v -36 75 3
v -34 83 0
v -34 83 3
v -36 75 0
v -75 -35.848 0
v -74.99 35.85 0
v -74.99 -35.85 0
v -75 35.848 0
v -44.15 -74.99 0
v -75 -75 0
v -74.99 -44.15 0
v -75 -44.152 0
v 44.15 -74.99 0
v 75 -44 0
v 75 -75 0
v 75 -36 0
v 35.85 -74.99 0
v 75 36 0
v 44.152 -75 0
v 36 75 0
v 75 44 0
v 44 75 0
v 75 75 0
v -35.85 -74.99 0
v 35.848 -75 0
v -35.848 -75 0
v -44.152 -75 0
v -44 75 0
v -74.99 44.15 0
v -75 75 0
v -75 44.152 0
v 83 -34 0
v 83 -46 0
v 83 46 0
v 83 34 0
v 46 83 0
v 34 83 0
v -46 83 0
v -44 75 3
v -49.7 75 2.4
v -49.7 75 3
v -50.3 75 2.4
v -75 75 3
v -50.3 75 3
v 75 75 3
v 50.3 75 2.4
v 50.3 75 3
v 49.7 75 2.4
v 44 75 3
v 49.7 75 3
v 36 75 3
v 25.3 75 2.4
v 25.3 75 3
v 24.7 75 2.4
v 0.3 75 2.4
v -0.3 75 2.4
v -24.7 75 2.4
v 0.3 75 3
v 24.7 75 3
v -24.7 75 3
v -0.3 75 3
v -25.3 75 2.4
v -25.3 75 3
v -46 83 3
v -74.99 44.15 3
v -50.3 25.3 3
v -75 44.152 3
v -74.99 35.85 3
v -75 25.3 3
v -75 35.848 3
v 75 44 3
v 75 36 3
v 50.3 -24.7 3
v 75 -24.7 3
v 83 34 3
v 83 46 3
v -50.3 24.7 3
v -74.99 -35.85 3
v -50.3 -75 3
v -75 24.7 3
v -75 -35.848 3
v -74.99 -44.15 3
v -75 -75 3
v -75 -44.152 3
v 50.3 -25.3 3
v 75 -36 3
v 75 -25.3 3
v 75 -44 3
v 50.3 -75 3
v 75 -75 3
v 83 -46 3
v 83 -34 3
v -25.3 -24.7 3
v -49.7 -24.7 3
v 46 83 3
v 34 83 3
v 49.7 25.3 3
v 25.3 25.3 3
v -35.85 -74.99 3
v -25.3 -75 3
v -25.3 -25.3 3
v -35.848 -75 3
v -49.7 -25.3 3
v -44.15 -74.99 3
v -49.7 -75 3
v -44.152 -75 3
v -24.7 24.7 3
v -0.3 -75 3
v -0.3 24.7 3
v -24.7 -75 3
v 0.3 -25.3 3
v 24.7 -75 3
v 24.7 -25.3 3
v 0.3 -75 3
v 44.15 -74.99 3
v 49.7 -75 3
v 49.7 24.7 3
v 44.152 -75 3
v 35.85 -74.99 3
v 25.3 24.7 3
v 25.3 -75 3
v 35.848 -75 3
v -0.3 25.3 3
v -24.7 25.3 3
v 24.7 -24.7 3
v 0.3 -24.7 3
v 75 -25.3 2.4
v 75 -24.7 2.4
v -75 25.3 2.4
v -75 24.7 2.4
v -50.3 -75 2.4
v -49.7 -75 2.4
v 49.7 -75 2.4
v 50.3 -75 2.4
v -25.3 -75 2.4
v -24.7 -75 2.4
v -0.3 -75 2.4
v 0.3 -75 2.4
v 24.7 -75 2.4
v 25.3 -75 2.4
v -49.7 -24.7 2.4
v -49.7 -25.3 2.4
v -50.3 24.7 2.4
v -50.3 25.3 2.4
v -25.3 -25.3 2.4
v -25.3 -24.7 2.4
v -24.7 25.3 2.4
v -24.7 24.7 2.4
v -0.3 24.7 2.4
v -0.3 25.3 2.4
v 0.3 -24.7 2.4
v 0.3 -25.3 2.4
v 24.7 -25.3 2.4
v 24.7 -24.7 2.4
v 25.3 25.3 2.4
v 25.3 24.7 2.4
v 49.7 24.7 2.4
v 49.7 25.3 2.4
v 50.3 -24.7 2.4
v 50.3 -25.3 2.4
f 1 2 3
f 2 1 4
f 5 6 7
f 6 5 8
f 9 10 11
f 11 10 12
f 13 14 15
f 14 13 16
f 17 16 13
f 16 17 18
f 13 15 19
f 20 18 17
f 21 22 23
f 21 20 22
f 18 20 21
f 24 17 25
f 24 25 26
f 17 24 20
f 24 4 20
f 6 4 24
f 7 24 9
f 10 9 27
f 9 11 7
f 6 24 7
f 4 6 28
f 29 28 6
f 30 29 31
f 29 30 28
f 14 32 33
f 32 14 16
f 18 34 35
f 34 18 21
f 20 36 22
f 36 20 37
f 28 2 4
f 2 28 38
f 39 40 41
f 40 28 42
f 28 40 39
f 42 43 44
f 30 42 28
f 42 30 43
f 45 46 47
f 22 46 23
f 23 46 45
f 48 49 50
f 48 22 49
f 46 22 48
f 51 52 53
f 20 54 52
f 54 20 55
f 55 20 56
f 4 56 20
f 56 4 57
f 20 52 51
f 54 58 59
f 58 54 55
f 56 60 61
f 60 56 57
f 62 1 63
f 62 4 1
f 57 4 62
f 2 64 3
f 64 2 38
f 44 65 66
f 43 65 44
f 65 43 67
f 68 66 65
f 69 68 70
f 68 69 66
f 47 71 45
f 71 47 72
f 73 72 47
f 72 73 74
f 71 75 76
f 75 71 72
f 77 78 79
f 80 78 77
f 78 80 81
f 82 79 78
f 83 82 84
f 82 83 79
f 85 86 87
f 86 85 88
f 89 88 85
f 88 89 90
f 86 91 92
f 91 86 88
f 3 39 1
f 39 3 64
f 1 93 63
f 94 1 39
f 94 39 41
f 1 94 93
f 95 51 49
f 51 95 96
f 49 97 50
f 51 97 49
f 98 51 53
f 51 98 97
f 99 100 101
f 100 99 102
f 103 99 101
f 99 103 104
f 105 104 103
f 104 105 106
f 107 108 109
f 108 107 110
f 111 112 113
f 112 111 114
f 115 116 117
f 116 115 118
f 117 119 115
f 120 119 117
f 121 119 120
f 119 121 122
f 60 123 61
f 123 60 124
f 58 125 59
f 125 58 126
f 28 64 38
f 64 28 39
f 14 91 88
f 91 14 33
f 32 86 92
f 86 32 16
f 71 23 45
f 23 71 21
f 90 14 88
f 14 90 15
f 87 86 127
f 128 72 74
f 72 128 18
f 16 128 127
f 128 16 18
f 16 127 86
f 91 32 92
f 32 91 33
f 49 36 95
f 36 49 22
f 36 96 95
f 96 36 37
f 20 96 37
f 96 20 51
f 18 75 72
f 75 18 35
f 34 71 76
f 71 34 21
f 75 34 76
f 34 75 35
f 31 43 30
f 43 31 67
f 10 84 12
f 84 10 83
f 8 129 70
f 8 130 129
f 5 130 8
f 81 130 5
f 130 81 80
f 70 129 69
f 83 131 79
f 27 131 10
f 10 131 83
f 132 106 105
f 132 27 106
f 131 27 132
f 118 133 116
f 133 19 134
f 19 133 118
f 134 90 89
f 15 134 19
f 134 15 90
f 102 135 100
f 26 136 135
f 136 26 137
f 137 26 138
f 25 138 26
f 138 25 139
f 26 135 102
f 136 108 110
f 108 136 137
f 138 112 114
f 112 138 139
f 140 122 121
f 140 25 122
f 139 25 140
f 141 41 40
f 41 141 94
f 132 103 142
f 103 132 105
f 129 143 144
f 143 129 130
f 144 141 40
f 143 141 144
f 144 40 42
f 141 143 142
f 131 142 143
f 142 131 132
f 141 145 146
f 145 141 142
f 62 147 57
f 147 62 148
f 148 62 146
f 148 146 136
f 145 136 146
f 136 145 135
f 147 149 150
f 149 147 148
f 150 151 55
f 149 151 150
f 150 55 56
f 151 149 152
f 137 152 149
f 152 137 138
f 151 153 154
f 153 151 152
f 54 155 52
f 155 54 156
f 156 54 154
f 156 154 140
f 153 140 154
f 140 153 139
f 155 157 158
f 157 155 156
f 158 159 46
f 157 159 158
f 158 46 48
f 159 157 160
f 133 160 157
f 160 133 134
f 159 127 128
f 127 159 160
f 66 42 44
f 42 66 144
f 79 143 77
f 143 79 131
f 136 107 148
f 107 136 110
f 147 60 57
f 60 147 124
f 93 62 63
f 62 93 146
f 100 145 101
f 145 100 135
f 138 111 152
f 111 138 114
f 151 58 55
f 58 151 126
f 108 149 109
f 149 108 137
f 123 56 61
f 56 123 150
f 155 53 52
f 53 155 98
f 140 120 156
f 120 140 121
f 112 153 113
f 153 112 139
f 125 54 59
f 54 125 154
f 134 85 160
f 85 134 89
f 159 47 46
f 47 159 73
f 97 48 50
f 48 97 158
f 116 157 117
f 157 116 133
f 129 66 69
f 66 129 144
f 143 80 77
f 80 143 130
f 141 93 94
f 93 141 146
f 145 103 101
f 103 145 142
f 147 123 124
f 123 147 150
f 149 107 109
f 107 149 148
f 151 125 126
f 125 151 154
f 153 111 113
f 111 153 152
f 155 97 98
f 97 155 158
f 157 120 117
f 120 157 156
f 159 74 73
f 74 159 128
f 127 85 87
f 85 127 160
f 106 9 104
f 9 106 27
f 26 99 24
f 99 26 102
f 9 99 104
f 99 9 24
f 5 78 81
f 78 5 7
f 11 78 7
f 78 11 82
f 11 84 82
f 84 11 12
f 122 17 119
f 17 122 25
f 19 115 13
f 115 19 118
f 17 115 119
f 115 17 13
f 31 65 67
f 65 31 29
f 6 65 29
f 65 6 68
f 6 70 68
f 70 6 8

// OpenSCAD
// file: ../lib/dovetail.scad
// lib/dovetail.scad
// Shared joinery modules: dovetail tenon/mortise, M3 insert boss, rounded box.
// Depends on values in params.scad (include it in the calling file).

// A dovetail tenon: a flared prism that grows wider toward its tip so it locks
// against a matching mortise when slid in along +y.
//   len   : protrusion length (along +y)
//   base_w: width at the root (x, near the part)
//   tip_w : width at the tip (x, wider -> self locking)
//   h     : height (z)
// Literal defaults keep this library self-contained under `use <>` (which does
// not import the caller's params). Callers pass explicit sizes where needed.
module dovetail_tenon(len = 8, base_w = 8, tip_w = 12, h = 10) {
    linear_extrude(height = h)
        polygon(points = [
            [-base_w/2, 0],
            [ base_w/2, 0],
            [ tip_w/2,  len],
            [-tip_w/2,  len],
        ]);
}

// Matching mortise volume (subtract this). Enlarged by tol_dovetail per side.
module dovetail_mortise(len = 8, base_w = 8, tip_w = 12, h = 10, clr = 0.15) {
    // extend slightly beyond both faces so the cut is clean
    translate([0, -0.01, -0.01])
        linear_extrude(height = h + 0.02)
            polygon(points = [
                [-(base_w/2 + clr), 0],
                [ (base_w/2 + clr), 0],
                [ (tip_w/2 + clr),  len + 0.02],
                [-(tip_w/2 + clr),  len + 0.02],
            ]);
}

// Cylindrical boss with a blind hole for a heat-set insert.
//   boss_d : outer diameter of the boss
//   boss_h : height
//   hole_d : insert press-hole diameter (params: m3_insert)
//   hole_depth : blind hole depth (0 = through)
module insert_boss(boss_d = 8, boss_h = 8, hole_d = 4.0, hole_depth = 0) {
    difference() {
        cylinder(d = boss_d, h = boss_h);
        translate([0, 0, hole_depth == 0 ? -0.01 : boss_h - hole_depth])
            cylinder(d = hole_d, h = hole_depth == 0 ? boss_h + 0.02 : hole_depth + 0.01);
    }
}

// Rounded rectangular box shell (open top) used by gondola / recesses.
module rounded_box(x, y, z, r = 2) {
    hull() {
        for (sx = [-1, 1], sy = [-1, 1])
            translate([sx * (x/2 - r), sy * (y/2 - r), 0])
                cylinder(r = r, h = z);
    }
}

// A simple rectangular slot cutter (for tabs), centered on x, open along z.
module slot(w, t, d) {
    translate([-w/2, -t/2, -0.01])
        cube([w, t, d + 0.02]);
}
// main file
// booth/floor_tile.scad
// Classroom flooring tile 150 x 150 x 3. Top face carries a wood-plank relief
// (25 mm planks, 0.6 mm seams) that casts shadow lines without painting.
// Edges: dovetails on +X and +Y (male), mortises on -X and -Y (female), so
// identical tiles tile into a grid.

include <../params.scad>;
use <../lib/dovetail.scad>;

nplank   = tile_x / plank_w;    // 6
dt_off   = 40;                  // dovetail offset from centre on each edge
dt_h_t   = tile_t;             // dovetail spans full tile thickness

module planks() {
    // longitudinal seams (run in Y)
    for (i = [1 : nplank - 1])
        translate([-tile_x/2 + i * plank_w - groove_w/2, -tile_y/2 - 1, tile_t - groove_d])
            cube([groove_w, tile_y + 2, groove_d + 0.1]);
    // staggered plank-end seams (run in X, one per plank column)
    for (i = [0 : nplank - 1])
        translate([-tile_x/2 + i * plank_w, (i % 2 == 0 ? 25 : -25) - groove_w/2, tile_t - groove_d])
            cube([plank_w, groove_w, groove_d + 0.1]);
}

variant = "plain";            // "plain" | "wall" (socket curb on the +Y edge)

module floor_tile() {
    difference() {
        union() {
            translate([-tile_x/2, -tile_y/2, 0]) cube([tile_x, tile_y, tile_t]);
            // male dovetails on +X and +Y edges
            for (o = [-dt_off, dt_off]) {
                translate([o, tile_y/2, 0]) dovetail_tenon(h = dt_h_t);
                translate([tile_x/2, o, 0]) rotate([0, 0, -90]) dovetail_tenon(h = dt_h_t);
            }
        }
        planks();
        // female dovetails on -X and -Y edges
        for (o = [-dt_off, dt_off]) {
            translate([o, -tile_y/2, 0]) rotate([0, 0, 180]) dovetail_mortise(h = dt_h_t);
            translate([-tile_x/2, o, 0]) rotate([0, 0, 90]) dovetail_mortise(h = dt_h_t);
        }
    }
}

// 7/23 LT-diorama: wall panels plug straight into the floor (no stands).
// A raised socket curb on the +Y edge takes the panel's two bottom tabs
// (20 x 5 at +/-40) -> ~12 mm engagement instead of the bare 3 mm tile.
module wall_socket_tile() {
    difference() {
        union() {
            floor_tile();
            translate([-tile_x/2, tile_y/2 - sock_w, 0])
                cube([tile_x, sock_w, sock_h]);
        }
        // two tab slots, through the curb and tile (panel rests on the curb
        // top at z=13; tabs reach z=1, just above the table)
        for (o = [-40, 40])
            translate([o - (wall_tab_w + 0.8)/2, tile_y/2 - sock_w/2 - (wall_t + 0.8)/2, -1])
                cube([wall_tab_w + 0.8, wall_t + 0.8, sock_h + 2]);
    }
}

if (variant == "wall") wall_socket_tile();
else                   floor_tile();
